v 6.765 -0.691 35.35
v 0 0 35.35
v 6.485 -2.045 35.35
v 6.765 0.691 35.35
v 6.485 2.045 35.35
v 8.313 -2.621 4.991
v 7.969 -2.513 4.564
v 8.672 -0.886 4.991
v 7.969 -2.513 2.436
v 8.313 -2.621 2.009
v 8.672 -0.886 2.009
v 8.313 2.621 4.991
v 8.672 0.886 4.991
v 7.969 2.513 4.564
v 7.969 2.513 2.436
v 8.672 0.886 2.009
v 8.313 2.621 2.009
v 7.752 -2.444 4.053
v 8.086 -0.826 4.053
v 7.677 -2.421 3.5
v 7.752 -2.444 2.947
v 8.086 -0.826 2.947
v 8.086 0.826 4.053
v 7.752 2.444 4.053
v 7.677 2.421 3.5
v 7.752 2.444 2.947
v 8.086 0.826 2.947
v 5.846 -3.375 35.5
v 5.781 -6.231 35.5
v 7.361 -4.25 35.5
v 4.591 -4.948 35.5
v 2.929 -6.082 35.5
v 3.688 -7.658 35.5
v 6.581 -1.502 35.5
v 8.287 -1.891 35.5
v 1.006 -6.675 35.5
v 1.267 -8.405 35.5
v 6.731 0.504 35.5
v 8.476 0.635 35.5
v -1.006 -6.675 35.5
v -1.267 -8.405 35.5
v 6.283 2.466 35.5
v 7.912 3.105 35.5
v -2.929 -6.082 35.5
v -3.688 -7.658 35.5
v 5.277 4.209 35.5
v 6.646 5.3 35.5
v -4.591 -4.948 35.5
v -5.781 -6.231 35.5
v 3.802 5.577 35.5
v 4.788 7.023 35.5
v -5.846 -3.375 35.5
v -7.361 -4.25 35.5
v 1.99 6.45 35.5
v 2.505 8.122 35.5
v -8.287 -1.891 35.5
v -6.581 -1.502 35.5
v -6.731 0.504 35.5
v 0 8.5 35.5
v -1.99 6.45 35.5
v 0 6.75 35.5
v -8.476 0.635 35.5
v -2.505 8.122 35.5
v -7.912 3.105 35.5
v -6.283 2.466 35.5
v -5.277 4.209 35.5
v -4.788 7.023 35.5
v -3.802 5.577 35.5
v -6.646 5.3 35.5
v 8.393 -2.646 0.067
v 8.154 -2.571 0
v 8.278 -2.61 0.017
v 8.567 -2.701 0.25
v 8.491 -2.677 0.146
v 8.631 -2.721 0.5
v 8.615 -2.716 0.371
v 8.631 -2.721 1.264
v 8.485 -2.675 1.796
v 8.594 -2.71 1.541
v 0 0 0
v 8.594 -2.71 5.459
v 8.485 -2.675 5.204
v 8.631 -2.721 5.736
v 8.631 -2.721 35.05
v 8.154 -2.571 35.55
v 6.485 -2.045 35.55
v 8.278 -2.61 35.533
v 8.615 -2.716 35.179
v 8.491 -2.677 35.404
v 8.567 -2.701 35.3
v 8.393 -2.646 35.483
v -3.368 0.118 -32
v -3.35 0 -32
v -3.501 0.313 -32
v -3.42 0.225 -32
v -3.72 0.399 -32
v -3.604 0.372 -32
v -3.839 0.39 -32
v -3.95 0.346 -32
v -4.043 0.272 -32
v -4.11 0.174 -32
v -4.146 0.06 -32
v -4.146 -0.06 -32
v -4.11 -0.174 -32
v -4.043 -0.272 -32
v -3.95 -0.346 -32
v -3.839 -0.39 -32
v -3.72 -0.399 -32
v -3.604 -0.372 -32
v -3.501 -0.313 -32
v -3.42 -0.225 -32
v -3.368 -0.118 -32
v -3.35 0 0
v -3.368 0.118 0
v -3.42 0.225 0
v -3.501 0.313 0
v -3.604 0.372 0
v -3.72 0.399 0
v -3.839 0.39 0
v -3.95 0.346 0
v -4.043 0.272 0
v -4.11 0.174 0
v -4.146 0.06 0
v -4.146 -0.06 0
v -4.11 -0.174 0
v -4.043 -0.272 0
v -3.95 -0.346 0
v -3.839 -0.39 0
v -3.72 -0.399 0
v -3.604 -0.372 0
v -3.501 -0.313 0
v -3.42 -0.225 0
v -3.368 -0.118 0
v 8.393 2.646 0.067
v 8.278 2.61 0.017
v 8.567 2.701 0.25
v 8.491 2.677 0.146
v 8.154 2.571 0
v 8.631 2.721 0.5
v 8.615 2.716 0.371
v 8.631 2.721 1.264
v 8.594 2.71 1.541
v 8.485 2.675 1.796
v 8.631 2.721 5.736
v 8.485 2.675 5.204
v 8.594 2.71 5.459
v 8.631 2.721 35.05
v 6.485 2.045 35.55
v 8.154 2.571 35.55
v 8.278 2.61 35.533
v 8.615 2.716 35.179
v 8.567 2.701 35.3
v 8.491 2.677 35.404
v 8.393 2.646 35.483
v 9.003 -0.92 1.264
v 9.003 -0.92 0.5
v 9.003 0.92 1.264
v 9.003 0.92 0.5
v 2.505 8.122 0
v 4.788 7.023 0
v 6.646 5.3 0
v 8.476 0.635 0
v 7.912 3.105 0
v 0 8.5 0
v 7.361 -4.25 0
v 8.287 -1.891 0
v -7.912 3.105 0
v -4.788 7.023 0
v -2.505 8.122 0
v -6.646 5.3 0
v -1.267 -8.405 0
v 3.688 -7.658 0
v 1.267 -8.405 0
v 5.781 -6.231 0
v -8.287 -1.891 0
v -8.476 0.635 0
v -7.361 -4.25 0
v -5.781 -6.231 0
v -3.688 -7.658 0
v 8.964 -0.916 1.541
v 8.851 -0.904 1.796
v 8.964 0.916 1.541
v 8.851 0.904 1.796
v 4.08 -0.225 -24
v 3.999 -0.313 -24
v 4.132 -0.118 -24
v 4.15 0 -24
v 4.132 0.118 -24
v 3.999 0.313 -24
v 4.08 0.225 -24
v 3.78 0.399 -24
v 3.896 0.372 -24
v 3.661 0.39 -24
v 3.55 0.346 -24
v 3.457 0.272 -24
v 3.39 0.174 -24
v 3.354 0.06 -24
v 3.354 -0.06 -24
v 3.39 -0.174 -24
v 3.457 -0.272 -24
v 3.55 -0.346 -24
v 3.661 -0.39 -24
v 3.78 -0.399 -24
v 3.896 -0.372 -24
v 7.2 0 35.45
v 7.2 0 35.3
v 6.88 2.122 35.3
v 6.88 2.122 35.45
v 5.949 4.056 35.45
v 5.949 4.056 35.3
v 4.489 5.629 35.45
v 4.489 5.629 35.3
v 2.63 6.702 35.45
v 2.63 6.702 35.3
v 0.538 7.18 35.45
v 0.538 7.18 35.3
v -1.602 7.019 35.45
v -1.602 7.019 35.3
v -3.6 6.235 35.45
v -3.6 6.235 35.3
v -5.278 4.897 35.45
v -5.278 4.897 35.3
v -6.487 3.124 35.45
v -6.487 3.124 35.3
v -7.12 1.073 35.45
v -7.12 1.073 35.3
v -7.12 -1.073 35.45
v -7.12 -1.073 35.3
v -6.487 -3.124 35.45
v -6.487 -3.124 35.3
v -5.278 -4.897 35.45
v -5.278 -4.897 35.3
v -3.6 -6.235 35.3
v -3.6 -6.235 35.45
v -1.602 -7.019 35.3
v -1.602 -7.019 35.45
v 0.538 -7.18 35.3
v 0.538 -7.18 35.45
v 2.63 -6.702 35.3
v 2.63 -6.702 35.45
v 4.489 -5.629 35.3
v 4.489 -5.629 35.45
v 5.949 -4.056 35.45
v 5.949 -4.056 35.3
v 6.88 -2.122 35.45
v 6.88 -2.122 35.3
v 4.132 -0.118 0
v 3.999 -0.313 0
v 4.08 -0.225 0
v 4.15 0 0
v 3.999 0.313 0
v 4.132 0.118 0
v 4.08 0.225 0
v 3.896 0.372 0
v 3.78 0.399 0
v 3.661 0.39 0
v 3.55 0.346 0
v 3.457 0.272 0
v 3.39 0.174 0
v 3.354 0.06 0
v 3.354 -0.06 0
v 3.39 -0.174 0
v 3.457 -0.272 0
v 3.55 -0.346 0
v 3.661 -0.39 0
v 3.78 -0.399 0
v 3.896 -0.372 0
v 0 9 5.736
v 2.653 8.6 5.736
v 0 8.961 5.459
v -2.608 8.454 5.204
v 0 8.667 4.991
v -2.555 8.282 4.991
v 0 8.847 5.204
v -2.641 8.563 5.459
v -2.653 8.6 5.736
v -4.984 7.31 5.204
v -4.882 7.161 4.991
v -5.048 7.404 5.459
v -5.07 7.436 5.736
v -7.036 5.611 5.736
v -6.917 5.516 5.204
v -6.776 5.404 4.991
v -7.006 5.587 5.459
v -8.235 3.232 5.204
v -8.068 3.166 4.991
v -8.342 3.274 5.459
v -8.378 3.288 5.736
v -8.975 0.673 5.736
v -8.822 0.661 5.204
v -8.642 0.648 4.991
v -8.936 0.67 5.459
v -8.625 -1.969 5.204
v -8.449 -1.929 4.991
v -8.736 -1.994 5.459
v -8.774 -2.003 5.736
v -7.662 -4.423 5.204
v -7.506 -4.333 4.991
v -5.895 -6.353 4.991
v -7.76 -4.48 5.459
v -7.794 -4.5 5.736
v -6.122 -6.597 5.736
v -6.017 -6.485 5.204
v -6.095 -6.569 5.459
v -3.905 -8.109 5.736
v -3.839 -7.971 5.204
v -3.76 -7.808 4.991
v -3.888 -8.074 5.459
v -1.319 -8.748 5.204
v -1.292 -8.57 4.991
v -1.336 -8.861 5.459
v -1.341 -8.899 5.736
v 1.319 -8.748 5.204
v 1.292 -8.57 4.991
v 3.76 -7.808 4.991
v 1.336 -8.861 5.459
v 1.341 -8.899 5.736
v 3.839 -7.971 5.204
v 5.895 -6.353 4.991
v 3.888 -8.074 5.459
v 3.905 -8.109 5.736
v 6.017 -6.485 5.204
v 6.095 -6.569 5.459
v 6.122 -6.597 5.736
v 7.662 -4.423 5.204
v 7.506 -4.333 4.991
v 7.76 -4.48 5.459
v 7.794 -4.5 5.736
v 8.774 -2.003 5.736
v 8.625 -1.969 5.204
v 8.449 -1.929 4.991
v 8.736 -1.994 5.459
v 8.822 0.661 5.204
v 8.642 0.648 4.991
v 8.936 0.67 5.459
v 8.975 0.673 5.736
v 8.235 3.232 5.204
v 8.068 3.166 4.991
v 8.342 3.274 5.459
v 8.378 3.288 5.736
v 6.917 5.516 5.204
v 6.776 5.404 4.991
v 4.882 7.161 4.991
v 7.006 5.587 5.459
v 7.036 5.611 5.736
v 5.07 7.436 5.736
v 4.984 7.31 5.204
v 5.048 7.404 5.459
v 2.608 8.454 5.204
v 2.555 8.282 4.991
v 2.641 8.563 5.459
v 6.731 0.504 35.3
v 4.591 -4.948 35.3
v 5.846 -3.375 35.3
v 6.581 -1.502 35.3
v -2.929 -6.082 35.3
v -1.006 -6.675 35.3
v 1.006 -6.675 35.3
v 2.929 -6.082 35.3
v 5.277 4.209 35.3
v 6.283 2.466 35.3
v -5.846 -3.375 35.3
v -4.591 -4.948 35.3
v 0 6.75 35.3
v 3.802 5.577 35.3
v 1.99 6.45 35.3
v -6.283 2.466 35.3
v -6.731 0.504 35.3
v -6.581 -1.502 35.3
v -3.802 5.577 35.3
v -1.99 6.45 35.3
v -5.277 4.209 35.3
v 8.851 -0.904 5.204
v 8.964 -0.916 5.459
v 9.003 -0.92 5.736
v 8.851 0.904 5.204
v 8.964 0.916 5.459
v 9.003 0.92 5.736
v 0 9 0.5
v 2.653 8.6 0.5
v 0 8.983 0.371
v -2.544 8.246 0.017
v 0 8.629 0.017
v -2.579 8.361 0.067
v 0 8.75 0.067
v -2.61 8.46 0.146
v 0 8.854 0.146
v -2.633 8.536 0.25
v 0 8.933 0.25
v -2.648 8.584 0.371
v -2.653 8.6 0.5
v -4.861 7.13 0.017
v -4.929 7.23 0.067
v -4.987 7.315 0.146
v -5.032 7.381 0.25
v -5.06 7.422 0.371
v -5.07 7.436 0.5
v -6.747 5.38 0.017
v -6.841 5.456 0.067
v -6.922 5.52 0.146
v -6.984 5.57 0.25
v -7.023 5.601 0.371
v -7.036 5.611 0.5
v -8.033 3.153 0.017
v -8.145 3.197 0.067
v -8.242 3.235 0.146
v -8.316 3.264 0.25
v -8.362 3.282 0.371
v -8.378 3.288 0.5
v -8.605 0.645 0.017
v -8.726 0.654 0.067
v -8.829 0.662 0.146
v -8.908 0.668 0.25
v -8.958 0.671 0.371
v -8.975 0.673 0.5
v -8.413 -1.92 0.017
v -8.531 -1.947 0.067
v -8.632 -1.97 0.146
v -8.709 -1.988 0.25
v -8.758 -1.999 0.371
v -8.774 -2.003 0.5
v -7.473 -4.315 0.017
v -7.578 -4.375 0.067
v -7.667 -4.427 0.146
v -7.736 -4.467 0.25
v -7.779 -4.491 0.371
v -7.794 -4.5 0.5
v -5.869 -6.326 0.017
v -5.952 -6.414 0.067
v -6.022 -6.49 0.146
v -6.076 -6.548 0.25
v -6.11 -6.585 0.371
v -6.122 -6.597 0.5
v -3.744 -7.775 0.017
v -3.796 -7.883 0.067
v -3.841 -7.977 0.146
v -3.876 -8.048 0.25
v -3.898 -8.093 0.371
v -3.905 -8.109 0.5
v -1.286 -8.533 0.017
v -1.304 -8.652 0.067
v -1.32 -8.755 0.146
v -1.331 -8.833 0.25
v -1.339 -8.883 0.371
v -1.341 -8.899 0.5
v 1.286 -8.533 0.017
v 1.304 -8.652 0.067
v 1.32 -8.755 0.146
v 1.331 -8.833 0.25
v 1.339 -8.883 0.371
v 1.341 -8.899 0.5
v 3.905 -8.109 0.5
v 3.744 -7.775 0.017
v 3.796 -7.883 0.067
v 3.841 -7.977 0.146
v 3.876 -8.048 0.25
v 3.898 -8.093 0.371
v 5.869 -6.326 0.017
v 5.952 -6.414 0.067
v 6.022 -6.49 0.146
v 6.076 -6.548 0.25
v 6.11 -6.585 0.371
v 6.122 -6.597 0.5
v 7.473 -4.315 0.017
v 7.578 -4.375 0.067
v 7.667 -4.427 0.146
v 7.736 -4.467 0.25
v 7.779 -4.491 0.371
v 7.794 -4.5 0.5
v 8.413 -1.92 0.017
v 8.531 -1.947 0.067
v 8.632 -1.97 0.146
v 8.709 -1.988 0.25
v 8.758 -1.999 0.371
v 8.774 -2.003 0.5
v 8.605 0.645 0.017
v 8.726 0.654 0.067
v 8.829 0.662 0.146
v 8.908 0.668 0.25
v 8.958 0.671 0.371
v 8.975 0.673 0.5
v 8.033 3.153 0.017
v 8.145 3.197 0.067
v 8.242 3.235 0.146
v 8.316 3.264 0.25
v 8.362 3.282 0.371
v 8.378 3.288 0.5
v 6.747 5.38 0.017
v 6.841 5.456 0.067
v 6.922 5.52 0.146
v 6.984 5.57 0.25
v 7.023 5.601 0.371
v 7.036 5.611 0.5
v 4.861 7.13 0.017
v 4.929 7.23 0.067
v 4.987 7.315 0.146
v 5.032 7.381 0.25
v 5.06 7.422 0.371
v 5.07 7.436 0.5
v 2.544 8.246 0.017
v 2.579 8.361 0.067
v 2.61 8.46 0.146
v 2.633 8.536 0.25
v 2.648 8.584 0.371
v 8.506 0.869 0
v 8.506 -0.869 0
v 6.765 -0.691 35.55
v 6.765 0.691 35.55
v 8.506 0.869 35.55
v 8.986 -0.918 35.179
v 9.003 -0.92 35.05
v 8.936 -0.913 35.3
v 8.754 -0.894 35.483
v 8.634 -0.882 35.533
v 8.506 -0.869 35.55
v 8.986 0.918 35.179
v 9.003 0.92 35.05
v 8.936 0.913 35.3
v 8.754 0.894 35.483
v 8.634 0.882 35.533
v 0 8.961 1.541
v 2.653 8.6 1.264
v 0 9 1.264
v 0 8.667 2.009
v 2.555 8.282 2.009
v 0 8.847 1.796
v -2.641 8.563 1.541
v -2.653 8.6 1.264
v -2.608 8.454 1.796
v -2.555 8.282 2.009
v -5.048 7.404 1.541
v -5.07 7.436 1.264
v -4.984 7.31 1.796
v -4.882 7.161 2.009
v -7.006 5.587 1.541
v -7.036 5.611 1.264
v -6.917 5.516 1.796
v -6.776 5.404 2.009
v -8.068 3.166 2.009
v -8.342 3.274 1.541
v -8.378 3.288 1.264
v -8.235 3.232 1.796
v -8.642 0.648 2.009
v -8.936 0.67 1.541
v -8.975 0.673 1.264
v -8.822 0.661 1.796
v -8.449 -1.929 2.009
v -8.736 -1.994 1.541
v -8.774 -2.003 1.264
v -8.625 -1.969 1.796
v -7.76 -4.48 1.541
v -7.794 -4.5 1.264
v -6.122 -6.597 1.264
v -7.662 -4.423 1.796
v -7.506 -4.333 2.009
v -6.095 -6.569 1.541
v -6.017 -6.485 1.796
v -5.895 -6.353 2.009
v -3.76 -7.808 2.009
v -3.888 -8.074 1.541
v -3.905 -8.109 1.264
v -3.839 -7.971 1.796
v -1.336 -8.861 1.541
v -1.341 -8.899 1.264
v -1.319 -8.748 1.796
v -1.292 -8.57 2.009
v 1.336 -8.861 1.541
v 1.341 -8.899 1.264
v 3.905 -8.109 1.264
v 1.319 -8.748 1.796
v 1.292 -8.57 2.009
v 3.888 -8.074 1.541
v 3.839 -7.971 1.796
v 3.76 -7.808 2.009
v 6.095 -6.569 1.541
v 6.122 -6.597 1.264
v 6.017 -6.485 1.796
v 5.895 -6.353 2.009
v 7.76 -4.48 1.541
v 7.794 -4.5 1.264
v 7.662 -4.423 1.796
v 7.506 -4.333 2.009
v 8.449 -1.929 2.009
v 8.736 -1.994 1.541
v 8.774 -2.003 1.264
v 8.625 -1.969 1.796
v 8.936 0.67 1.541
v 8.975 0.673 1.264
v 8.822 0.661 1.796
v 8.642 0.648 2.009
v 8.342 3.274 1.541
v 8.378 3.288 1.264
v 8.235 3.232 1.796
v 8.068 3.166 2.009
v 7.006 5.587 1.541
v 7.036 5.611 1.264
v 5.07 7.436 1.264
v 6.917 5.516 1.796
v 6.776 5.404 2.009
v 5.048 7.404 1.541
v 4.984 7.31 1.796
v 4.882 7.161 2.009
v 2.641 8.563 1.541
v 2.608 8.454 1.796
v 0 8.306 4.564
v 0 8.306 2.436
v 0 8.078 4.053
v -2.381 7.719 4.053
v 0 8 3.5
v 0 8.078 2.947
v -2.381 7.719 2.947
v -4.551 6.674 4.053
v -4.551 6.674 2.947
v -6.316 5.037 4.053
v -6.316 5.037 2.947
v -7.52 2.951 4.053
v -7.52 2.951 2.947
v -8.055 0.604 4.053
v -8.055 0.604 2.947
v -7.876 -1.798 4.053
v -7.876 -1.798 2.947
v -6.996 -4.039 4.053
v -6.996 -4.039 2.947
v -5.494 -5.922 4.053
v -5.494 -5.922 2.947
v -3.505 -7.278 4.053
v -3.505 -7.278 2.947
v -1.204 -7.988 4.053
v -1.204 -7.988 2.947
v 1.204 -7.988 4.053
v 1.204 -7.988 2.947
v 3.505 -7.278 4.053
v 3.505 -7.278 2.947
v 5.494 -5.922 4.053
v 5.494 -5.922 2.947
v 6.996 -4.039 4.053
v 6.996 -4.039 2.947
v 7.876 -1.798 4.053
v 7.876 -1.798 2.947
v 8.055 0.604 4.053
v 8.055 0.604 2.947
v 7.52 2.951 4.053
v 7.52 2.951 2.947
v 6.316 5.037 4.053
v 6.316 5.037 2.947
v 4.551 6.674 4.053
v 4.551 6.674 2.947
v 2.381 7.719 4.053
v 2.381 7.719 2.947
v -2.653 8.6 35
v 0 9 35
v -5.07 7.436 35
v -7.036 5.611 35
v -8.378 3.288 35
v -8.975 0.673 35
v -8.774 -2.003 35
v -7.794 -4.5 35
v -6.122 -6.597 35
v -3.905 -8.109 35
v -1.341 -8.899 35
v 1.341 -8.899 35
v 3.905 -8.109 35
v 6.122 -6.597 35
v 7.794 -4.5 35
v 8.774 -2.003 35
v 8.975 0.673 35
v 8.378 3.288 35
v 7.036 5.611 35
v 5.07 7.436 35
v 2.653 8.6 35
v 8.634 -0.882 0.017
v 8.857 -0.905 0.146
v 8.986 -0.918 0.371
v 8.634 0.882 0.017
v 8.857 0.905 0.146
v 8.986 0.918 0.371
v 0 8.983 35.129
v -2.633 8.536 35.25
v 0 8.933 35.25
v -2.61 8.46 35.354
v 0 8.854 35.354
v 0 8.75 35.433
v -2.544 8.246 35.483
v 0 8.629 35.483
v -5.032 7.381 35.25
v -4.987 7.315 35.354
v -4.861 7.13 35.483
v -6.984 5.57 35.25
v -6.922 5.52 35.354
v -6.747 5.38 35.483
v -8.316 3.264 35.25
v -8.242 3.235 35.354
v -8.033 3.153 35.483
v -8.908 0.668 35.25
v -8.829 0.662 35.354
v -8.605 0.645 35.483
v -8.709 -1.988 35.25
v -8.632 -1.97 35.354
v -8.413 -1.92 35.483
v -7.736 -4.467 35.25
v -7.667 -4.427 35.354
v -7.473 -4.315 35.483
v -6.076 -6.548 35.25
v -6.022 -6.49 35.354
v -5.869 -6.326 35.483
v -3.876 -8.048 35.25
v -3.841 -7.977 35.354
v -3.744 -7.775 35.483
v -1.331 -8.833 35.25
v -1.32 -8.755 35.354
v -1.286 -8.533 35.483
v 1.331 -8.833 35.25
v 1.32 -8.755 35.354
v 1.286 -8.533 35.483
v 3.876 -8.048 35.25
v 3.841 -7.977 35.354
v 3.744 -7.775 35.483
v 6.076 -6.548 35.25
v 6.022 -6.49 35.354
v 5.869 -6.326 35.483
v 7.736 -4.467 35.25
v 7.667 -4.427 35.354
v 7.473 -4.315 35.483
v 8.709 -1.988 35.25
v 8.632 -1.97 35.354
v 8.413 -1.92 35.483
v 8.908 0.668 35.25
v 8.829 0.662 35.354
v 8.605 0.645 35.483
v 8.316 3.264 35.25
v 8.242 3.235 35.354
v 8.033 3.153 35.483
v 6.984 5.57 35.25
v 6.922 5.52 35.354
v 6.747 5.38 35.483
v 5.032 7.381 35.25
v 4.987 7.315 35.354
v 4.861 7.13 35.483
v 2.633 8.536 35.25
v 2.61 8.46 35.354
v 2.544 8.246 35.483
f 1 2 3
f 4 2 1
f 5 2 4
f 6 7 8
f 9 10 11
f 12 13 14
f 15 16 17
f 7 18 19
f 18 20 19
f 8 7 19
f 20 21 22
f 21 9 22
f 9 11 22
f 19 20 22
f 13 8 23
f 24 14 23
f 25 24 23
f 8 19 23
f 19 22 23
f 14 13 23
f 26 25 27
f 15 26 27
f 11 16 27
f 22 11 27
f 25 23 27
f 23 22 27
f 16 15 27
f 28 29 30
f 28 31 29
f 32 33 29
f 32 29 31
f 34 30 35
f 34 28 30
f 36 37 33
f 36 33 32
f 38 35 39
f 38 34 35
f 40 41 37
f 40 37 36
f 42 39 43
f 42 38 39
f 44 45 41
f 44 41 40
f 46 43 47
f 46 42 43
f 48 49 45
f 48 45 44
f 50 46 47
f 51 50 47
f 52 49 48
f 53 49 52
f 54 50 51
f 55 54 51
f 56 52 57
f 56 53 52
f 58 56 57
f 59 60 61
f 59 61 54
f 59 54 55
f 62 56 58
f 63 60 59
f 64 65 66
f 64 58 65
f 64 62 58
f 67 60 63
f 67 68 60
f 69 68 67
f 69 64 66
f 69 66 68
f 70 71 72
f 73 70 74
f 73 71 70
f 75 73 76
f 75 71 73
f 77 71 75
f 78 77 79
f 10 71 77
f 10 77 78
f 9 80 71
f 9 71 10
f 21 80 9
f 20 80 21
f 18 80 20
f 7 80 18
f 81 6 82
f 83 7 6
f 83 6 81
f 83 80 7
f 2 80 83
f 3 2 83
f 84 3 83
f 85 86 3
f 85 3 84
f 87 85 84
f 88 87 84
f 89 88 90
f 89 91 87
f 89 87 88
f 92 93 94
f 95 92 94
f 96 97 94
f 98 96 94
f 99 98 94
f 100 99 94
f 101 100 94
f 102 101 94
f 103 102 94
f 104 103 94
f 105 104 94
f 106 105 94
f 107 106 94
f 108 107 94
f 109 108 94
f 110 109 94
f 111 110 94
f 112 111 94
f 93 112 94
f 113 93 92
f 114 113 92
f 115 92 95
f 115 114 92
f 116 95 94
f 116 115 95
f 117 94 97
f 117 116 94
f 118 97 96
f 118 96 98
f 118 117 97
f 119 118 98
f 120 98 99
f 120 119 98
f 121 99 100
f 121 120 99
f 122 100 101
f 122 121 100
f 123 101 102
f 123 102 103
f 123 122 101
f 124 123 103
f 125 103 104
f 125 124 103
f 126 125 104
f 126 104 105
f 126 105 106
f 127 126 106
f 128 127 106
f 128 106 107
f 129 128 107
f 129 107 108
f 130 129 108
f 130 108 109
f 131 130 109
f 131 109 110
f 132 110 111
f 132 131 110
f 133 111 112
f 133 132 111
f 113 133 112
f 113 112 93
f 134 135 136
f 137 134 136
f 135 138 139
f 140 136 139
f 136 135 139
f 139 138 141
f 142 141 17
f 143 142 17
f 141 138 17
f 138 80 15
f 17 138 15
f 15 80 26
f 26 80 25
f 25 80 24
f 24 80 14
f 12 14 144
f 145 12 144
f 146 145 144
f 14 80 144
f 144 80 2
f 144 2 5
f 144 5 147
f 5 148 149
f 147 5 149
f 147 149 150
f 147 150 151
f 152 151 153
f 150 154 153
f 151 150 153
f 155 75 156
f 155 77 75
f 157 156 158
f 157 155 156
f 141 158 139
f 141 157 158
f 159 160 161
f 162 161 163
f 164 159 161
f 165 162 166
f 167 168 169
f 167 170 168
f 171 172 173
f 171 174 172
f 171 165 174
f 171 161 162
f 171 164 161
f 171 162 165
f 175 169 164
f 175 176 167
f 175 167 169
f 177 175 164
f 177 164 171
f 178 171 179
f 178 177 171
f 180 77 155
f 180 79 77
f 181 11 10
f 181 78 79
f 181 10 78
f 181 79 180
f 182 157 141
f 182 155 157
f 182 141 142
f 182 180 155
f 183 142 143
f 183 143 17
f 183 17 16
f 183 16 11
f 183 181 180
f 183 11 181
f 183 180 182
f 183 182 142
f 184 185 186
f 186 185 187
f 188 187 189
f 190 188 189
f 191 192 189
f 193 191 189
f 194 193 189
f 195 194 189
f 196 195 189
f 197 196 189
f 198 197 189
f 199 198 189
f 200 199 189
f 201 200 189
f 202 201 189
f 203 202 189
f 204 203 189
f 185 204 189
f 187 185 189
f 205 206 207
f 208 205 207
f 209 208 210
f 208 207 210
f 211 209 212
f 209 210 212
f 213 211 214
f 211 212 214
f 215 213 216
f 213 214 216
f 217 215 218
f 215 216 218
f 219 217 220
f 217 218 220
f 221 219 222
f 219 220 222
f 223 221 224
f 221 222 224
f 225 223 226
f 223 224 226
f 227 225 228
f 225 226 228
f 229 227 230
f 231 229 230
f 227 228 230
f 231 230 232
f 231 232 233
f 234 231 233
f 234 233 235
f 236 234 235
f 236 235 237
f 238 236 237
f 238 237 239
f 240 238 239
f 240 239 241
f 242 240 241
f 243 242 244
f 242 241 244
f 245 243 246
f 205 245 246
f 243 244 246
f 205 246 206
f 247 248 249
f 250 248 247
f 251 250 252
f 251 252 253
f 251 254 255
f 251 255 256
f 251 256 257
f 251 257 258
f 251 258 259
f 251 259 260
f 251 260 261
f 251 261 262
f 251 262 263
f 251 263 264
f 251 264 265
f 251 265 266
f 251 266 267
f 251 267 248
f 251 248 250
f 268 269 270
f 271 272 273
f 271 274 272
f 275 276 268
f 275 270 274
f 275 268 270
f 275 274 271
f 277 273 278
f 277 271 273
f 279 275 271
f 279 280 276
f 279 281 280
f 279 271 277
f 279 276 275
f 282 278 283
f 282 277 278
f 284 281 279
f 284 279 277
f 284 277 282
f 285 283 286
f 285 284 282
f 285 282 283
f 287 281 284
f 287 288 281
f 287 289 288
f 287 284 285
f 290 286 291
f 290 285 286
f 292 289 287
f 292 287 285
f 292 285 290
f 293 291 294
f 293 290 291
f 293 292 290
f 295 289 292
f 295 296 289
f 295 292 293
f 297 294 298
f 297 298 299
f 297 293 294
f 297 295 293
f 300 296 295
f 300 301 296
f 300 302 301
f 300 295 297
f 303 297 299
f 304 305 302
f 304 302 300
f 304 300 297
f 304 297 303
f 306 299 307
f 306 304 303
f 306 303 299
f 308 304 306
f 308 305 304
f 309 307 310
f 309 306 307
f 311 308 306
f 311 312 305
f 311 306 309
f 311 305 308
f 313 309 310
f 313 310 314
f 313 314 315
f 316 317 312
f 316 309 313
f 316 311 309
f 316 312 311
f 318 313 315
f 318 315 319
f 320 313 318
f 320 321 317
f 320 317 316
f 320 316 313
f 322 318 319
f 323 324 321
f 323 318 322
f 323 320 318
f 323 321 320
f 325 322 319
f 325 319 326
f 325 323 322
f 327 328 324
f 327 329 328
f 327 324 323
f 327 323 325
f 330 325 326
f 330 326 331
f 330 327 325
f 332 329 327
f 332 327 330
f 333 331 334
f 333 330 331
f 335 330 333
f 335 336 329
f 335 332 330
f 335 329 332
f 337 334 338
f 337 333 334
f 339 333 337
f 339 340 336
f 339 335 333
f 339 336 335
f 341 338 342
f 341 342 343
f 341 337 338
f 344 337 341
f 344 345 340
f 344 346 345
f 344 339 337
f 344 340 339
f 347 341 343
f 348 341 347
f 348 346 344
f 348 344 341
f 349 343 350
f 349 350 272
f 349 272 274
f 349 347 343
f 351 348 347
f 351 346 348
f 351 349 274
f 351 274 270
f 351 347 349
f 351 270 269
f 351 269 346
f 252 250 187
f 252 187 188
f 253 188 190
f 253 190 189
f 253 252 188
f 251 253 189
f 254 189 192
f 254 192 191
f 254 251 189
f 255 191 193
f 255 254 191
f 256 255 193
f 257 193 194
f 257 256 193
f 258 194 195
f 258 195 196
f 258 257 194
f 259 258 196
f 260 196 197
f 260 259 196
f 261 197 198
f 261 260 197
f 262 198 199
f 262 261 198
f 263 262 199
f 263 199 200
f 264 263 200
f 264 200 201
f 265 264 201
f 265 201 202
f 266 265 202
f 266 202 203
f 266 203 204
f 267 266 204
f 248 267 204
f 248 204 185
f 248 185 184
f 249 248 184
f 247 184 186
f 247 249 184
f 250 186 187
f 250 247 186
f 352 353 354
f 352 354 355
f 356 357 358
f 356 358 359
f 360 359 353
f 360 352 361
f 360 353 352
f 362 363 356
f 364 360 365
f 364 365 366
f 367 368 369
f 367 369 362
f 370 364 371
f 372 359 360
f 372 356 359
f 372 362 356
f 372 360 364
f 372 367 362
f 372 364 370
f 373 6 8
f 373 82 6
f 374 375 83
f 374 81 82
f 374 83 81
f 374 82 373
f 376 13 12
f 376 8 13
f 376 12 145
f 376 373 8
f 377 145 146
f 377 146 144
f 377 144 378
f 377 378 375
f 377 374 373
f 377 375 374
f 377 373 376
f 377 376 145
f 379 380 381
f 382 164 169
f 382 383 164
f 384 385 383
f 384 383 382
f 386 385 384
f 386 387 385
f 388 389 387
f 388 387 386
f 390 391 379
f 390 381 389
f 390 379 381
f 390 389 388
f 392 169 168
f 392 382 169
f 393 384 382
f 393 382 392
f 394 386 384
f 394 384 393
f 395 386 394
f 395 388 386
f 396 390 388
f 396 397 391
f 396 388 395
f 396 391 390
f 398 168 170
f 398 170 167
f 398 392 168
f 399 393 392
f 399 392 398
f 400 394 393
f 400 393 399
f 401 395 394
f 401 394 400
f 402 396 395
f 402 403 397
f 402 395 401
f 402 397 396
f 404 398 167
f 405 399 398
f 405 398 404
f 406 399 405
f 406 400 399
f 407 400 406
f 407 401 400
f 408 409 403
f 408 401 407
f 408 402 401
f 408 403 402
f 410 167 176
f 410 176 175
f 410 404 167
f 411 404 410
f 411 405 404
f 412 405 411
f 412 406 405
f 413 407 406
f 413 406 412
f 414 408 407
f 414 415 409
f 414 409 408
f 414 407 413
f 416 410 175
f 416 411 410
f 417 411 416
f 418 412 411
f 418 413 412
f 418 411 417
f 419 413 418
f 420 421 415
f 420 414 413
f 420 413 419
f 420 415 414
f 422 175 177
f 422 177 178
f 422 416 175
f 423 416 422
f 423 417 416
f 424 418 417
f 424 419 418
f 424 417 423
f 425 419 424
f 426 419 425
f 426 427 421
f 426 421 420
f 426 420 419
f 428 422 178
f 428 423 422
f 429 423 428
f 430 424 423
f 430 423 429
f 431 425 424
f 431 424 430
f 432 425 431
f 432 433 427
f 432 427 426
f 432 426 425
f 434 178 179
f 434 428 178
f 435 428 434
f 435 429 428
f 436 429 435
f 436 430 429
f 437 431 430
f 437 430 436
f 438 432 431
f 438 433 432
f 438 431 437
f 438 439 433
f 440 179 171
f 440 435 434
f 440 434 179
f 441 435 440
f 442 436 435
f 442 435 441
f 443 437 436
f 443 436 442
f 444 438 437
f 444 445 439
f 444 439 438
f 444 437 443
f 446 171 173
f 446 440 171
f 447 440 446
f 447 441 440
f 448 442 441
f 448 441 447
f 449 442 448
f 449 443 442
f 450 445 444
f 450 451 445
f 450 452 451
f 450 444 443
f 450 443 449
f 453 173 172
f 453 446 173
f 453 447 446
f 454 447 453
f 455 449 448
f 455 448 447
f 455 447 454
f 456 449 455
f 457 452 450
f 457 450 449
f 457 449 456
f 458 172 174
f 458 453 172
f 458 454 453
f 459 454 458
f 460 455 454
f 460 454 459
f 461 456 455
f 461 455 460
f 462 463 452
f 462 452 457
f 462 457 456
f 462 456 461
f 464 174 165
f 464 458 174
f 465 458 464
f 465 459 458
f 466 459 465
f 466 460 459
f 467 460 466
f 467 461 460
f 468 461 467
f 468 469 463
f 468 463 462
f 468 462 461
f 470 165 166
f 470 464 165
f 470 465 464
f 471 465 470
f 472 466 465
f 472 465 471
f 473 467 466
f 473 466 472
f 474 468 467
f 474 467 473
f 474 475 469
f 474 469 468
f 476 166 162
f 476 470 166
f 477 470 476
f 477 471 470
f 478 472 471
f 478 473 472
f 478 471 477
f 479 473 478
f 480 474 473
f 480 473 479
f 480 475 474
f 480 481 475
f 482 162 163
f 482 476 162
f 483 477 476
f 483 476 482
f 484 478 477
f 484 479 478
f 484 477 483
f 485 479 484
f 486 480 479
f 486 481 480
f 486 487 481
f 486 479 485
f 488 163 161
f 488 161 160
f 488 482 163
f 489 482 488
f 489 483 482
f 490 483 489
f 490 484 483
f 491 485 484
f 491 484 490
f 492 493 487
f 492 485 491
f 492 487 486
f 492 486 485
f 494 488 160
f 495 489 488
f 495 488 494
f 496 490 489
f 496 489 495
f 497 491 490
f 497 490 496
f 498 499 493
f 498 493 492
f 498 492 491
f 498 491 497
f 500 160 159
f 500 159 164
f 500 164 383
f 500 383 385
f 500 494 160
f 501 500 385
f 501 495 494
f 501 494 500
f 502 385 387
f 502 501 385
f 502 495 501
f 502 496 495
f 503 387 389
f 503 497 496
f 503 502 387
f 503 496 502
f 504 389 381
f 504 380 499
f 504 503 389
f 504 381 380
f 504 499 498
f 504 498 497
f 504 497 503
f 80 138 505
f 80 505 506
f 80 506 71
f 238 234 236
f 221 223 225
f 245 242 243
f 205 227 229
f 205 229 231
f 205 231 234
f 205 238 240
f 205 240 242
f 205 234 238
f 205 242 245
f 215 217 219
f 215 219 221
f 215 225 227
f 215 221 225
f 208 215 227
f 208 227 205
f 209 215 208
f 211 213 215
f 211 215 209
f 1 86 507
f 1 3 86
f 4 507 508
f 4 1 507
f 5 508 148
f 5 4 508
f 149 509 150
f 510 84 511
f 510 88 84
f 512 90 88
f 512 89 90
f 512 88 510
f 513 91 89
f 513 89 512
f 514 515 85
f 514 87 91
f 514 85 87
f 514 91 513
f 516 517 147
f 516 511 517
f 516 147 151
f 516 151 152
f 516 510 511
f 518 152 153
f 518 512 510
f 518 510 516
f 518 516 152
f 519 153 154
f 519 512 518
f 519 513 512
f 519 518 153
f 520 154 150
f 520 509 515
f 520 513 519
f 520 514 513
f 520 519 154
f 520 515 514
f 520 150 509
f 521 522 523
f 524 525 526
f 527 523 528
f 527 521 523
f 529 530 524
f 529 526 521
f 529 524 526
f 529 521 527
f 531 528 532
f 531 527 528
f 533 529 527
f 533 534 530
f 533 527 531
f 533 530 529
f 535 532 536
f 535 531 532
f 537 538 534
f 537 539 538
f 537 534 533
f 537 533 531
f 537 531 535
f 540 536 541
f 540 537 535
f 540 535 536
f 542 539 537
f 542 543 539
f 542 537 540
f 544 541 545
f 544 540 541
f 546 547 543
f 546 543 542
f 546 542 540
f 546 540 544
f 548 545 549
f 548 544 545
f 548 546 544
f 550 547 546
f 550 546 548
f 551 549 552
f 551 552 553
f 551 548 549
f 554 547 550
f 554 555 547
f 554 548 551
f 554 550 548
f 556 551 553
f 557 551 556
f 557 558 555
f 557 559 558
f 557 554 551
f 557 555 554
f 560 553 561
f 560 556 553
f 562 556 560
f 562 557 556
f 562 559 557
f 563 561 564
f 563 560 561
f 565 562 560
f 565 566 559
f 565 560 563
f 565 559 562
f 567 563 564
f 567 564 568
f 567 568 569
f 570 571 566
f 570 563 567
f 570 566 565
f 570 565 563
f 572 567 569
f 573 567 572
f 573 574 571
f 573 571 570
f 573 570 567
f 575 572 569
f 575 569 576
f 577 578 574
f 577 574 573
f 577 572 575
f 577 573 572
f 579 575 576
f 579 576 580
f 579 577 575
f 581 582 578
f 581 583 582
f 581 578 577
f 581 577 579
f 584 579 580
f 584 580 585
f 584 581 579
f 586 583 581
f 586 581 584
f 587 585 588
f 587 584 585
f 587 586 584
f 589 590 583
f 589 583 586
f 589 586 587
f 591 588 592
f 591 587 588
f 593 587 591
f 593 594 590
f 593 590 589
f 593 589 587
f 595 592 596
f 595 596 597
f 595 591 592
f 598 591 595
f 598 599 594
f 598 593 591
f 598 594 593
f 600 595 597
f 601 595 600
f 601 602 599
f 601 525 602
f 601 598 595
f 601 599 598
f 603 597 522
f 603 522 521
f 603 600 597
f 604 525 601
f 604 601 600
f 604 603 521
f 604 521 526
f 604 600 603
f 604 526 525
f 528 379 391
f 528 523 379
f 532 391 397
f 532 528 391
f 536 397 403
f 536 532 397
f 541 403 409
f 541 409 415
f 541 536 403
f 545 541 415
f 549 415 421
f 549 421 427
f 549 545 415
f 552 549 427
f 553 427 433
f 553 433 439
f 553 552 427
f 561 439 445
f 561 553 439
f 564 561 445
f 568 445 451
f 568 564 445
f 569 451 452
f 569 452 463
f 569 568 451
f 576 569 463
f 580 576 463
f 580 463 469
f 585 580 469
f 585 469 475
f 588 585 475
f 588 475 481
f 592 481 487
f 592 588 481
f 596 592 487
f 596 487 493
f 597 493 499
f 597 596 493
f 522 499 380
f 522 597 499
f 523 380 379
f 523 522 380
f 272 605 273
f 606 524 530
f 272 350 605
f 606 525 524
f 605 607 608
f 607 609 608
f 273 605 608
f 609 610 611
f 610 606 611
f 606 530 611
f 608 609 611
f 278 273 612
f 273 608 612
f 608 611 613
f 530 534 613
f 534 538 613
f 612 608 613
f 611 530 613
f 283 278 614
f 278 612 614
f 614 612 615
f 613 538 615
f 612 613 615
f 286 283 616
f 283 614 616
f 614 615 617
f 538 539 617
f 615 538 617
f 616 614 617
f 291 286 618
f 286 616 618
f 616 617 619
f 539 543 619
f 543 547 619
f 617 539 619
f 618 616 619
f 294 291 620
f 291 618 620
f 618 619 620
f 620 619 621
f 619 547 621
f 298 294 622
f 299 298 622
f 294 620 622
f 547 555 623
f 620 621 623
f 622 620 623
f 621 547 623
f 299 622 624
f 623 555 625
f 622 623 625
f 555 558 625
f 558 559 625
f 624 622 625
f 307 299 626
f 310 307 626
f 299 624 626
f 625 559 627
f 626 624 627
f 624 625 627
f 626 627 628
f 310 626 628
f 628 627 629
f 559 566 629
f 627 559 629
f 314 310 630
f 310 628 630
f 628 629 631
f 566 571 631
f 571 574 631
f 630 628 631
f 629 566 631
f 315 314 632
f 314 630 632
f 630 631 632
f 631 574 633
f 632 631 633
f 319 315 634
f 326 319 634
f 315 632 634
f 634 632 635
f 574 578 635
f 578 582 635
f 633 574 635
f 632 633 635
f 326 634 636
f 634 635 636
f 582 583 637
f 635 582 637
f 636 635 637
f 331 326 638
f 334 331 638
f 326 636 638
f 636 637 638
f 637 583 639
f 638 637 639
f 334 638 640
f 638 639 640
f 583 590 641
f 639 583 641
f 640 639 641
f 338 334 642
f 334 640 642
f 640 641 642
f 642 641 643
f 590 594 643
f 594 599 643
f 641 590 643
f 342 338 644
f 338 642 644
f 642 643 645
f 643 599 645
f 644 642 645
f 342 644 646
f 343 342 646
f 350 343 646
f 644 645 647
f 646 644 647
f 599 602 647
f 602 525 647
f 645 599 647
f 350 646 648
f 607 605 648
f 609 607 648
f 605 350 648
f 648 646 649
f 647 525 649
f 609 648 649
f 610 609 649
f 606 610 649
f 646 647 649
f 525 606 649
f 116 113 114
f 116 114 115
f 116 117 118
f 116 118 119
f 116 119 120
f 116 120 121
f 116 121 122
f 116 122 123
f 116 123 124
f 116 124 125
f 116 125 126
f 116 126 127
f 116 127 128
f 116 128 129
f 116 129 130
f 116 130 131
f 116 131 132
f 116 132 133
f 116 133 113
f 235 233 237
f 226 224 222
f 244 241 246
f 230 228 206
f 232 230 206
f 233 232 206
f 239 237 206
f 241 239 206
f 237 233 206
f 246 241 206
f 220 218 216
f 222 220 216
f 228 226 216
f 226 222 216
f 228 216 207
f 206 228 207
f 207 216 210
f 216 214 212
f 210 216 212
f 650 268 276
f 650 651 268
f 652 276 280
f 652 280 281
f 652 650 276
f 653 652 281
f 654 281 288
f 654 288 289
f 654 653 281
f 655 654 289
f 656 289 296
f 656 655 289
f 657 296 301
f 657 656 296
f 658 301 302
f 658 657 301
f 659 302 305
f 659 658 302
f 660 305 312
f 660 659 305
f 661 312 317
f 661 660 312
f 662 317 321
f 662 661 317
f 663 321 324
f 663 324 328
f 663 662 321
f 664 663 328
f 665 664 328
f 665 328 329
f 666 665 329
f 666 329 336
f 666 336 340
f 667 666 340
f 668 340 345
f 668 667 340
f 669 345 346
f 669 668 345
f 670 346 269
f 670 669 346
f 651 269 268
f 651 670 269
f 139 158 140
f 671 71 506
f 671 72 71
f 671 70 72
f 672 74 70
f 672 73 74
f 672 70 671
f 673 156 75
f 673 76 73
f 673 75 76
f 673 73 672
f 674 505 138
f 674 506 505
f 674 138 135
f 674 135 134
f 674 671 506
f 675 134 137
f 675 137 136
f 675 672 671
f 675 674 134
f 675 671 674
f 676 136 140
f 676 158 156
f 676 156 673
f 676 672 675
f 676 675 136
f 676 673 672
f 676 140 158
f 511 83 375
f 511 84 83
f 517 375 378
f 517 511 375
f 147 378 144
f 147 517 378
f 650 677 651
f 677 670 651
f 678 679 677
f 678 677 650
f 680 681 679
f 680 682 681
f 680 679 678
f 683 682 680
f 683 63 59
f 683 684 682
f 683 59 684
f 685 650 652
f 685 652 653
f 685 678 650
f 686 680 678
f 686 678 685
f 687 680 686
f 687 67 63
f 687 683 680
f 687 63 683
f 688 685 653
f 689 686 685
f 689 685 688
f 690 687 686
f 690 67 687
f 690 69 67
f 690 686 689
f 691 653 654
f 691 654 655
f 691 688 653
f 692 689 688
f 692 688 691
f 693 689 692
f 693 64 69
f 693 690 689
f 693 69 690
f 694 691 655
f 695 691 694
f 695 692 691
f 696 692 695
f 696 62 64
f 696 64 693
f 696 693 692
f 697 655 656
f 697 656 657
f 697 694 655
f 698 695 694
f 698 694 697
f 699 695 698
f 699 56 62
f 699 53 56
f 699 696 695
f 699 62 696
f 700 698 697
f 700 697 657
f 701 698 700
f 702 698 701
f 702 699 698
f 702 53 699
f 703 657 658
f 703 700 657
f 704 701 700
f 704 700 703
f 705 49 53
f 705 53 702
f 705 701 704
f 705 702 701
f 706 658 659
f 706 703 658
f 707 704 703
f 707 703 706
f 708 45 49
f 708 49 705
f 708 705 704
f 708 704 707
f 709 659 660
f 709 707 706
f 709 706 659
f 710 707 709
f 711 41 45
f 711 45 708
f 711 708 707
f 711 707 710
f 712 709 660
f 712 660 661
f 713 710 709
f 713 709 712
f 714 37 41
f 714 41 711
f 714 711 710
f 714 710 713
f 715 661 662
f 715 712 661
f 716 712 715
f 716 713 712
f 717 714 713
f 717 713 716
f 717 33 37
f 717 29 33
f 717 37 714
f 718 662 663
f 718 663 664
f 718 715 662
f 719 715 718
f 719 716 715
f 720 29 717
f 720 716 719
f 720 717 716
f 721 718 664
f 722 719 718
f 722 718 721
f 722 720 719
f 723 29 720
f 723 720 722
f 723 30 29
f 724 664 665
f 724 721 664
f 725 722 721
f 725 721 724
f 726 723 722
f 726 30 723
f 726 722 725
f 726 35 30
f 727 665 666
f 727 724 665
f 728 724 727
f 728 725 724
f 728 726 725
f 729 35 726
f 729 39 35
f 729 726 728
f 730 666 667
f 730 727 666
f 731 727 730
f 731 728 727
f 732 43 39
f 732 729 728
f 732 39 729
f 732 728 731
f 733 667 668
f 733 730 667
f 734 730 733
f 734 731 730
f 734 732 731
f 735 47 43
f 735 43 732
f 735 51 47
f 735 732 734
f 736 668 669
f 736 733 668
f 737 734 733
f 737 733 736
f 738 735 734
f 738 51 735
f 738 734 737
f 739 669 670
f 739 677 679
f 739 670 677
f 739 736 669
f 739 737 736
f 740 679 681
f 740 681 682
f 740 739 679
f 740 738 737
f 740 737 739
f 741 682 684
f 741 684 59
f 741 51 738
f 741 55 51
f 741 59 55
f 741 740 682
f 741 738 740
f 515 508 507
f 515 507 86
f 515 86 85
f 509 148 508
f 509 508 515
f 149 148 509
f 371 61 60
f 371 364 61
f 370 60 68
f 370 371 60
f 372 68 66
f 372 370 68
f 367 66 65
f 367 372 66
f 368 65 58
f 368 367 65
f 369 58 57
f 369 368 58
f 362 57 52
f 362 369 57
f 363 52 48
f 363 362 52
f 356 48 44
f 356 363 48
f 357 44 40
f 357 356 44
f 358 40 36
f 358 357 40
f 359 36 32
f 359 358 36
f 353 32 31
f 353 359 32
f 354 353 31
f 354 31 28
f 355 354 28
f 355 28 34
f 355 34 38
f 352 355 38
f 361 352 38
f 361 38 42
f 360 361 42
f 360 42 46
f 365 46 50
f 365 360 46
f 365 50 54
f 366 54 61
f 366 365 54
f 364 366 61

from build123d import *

# Parameters (mm, degrees)
SKETCH002_R         = 0.4
PAD_DEPTH           = 32
SKETCH003_R         = 0.4
PAD001_DEPTH        = 24
REVOLUTION001_ANGLE = -35
SKETCH005_R         = 7.2
PAD002_DEPTH        = 0.15


with BuildPart() as body:
    # Sketch → Revolution (revolve)
    with BuildSketch(Plane.YZ):
        with BuildLine():
            Line((0, 0), (8.5, 0))
            ThreePointArc((8.5, 0), (8.853553, 0.146447), (9, 0.5))
            Line((9, 0.5), (9, 1.263932))
            ThreePointArc((9, 1.263932), (8.912871, 1.67218), (8.666667, 2.009288))
            ThreePointArc((8.666667, 4.990712), (8, 3.5), (8.666667, 2.009288))
            ThreePointArc((8.666667, 4.990712), (8.912871, 5.32782), (9, 5.736068))
            Line((9, 5.736068), (9, 35))
            ThreePointArc((9, 35), (8.853553, 35.353553), (8.5, 35.5))
            Line((8.5, 35.5), (6.75, 35.5))
            Line((6.75, 35.5), (6.75, 35.3))
            Line((6.75, 35.3), (0, 35.3))
            Line((0, 35.3), (0, 0))
        make_face()
    revolve(axis=Axis((0, 0, 0), (0, 0, 1)))


with BuildPart() as pin_anode:
    # Sketch002 → Pad (new body)
    with BuildSketch(Plane.XY):
        with Locations((-3.75, 0)):
            Circle(SKETCH002_R)
    extrude(amount=-PAD_DEPTH)


with BuildPart() as pin_kathode:
    # Sketch003 → Pad001 (new body)
    with BuildSketch(Plane.XY):
        with Locations((3.75, 0)):
            Circle(SKETCH003_R)
    extrude(amount=-PAD001_DEPTH)


with BuildPart() as body003:
    # Sketch004 → Revolution001 (revolve, symmetric)
    with BuildSketch(Plane.XZ) as revolution001_sk:
        with BuildLine():
            Line((0, 0), (8.55, 0))
            ThreePointArc((8.55, 0), (8.903553, 0.146447), (9.05, 0.5))
            Line((9.05, 0.5), (9.05, 1.263932))
            ThreePointArc((9.05, 1.263932), (8.962871, 1.67218), (8.716667, 2.009288))
            ThreePointArc((8.716667, 4.990712), (8.05, 3.5), (8.716667, 2.009288))
            ThreePointArc((8.716667, 4.990712), (8.962871, 5.32782), (9.05, 5.736068))
            Line((9.05, 5.736068), (9.05, 35.05))
            ThreePointArc((9.05, 35.05), (8.903553, 35.403553), (8.55, 35.55))
            Line((8.55, 35.55), (6.8, 35.55))
            Line((6.8, 35.55), (6.8, 35.35))
            Line((6.8, 35.35), (0, 35.35))
            Line((0, 35.35), (0, 0))
        make_face()
    revolve(axis=Axis((0, 0, 0), (0, 0, 1)), revolution_arc=REVOLUTION001_ANGLE / 2)
    revolve(revolution001_sk.sketch, axis=Axis((0, 0, 0), (0, 0, -1)), revolution_arc=REVOLUTION001_ANGLE / 2)


with BuildPart() as body004:
    # Sketch005 (on DatumPlane) → Pad002 (new body)
    with BuildSketch(Plane.XY.offset(35.3)):
        Circle(SKETCH005_R)
    extrude(amount=PAD002_DEPTH)


solid = Compound([body.part, pin_anode.part, pin_kathode.part, body003.part, body004.part])
